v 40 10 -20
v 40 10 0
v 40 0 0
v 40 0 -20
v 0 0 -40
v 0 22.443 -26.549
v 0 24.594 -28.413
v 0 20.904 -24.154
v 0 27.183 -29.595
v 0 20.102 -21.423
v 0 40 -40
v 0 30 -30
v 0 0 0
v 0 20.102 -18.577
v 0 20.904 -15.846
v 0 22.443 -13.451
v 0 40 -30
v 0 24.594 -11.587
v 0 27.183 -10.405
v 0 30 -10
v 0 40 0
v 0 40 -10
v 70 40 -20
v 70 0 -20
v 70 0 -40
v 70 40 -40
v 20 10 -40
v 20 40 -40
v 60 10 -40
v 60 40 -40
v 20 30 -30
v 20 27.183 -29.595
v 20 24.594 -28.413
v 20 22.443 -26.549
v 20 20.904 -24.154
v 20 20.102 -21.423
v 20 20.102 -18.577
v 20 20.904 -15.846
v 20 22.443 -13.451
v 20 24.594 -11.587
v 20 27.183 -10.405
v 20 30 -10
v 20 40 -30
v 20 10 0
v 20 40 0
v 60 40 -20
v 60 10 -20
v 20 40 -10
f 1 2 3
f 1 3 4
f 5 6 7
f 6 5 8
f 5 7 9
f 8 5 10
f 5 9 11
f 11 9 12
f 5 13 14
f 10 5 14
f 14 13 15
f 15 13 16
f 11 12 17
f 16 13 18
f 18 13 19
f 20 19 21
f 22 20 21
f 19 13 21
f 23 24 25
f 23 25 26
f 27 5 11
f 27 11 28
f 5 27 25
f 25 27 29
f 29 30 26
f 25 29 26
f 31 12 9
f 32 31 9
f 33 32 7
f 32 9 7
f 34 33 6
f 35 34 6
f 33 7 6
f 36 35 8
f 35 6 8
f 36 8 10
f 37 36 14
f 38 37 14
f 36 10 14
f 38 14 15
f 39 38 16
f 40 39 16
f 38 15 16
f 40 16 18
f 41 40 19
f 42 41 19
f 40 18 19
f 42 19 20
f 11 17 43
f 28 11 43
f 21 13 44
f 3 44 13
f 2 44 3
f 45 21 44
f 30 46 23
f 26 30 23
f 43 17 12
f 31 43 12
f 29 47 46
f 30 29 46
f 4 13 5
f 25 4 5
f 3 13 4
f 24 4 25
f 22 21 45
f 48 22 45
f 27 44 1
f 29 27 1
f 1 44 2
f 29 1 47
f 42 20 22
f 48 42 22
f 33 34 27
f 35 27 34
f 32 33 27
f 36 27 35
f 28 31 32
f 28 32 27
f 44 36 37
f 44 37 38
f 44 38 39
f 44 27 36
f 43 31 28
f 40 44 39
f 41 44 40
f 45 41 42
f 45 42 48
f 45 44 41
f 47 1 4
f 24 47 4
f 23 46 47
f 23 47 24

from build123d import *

# Parameters (mm, degrees)
SKETCH_1_W          = 70
SKETCH_1_H          = 40
EXTRUDE_1_DEPTH     = 40
SKETCH_2_W          = 40
SKETCH_2_H          = 30
CUT_EXTRUDE_1_DEPTH = 40
SKETCH_3_W          = 30
SKETCH_3_H          = 20
CUT_EXTRUDE_2_DEPTH = 40
CUT_EXTRUDE_3_DEPTH = 40


with BuildPart() as part:
    # 스케치1 → 보스-돌출1 (new body)
    with BuildSketch(Plane.XY):
        with Locations((35, 20)):
            Rectangle(SKETCH_1_W, SKETCH_1_H)
    extrude(amount=-EXTRUDE_1_DEPTH)

    # 스케치2 → 컷-돌출1 (cut)
    with BuildSketch(Plane.XY):
        with Locations((40, 25)):
            Rectangle(SKETCH_2_W, SKETCH_2_H)
    extrude(amount=-CUT_EXTRUDE_1_DEPTH, mode=Mode.SUBTRACT)

    # 스케치3 → 컷-돌출2 (cut)
    with BuildSketch(Plane(origin=(0, 40, 0), x_dir=(1, 0, 0), z_dir=(0, 1, 0))):
        with Locations((55, 10)):
            Rectangle(SKETCH_3_W, SKETCH_3_H)
    extrude(amount=-CUT_EXTRUDE_2_DEPTH, mode=Mode.SUBTRACT)

    # 스케치4 → 컷-돌출3 (cut)
    with BuildSketch(Plane.ZY):
        with BuildLine():
            Line((-30, 40), (-30, 30))
            ThreePointArc((-30, 30), (-20, 20), (-10, 30))
            Line((-10, 30), (-10, 40))
            Line((-10, 40), (-30, 40))
        make_face()
    extrude(amount=-CUT_EXTRUDE_3_DEPTH, mode=Mode.SUBTRACT)


solid = part.part
